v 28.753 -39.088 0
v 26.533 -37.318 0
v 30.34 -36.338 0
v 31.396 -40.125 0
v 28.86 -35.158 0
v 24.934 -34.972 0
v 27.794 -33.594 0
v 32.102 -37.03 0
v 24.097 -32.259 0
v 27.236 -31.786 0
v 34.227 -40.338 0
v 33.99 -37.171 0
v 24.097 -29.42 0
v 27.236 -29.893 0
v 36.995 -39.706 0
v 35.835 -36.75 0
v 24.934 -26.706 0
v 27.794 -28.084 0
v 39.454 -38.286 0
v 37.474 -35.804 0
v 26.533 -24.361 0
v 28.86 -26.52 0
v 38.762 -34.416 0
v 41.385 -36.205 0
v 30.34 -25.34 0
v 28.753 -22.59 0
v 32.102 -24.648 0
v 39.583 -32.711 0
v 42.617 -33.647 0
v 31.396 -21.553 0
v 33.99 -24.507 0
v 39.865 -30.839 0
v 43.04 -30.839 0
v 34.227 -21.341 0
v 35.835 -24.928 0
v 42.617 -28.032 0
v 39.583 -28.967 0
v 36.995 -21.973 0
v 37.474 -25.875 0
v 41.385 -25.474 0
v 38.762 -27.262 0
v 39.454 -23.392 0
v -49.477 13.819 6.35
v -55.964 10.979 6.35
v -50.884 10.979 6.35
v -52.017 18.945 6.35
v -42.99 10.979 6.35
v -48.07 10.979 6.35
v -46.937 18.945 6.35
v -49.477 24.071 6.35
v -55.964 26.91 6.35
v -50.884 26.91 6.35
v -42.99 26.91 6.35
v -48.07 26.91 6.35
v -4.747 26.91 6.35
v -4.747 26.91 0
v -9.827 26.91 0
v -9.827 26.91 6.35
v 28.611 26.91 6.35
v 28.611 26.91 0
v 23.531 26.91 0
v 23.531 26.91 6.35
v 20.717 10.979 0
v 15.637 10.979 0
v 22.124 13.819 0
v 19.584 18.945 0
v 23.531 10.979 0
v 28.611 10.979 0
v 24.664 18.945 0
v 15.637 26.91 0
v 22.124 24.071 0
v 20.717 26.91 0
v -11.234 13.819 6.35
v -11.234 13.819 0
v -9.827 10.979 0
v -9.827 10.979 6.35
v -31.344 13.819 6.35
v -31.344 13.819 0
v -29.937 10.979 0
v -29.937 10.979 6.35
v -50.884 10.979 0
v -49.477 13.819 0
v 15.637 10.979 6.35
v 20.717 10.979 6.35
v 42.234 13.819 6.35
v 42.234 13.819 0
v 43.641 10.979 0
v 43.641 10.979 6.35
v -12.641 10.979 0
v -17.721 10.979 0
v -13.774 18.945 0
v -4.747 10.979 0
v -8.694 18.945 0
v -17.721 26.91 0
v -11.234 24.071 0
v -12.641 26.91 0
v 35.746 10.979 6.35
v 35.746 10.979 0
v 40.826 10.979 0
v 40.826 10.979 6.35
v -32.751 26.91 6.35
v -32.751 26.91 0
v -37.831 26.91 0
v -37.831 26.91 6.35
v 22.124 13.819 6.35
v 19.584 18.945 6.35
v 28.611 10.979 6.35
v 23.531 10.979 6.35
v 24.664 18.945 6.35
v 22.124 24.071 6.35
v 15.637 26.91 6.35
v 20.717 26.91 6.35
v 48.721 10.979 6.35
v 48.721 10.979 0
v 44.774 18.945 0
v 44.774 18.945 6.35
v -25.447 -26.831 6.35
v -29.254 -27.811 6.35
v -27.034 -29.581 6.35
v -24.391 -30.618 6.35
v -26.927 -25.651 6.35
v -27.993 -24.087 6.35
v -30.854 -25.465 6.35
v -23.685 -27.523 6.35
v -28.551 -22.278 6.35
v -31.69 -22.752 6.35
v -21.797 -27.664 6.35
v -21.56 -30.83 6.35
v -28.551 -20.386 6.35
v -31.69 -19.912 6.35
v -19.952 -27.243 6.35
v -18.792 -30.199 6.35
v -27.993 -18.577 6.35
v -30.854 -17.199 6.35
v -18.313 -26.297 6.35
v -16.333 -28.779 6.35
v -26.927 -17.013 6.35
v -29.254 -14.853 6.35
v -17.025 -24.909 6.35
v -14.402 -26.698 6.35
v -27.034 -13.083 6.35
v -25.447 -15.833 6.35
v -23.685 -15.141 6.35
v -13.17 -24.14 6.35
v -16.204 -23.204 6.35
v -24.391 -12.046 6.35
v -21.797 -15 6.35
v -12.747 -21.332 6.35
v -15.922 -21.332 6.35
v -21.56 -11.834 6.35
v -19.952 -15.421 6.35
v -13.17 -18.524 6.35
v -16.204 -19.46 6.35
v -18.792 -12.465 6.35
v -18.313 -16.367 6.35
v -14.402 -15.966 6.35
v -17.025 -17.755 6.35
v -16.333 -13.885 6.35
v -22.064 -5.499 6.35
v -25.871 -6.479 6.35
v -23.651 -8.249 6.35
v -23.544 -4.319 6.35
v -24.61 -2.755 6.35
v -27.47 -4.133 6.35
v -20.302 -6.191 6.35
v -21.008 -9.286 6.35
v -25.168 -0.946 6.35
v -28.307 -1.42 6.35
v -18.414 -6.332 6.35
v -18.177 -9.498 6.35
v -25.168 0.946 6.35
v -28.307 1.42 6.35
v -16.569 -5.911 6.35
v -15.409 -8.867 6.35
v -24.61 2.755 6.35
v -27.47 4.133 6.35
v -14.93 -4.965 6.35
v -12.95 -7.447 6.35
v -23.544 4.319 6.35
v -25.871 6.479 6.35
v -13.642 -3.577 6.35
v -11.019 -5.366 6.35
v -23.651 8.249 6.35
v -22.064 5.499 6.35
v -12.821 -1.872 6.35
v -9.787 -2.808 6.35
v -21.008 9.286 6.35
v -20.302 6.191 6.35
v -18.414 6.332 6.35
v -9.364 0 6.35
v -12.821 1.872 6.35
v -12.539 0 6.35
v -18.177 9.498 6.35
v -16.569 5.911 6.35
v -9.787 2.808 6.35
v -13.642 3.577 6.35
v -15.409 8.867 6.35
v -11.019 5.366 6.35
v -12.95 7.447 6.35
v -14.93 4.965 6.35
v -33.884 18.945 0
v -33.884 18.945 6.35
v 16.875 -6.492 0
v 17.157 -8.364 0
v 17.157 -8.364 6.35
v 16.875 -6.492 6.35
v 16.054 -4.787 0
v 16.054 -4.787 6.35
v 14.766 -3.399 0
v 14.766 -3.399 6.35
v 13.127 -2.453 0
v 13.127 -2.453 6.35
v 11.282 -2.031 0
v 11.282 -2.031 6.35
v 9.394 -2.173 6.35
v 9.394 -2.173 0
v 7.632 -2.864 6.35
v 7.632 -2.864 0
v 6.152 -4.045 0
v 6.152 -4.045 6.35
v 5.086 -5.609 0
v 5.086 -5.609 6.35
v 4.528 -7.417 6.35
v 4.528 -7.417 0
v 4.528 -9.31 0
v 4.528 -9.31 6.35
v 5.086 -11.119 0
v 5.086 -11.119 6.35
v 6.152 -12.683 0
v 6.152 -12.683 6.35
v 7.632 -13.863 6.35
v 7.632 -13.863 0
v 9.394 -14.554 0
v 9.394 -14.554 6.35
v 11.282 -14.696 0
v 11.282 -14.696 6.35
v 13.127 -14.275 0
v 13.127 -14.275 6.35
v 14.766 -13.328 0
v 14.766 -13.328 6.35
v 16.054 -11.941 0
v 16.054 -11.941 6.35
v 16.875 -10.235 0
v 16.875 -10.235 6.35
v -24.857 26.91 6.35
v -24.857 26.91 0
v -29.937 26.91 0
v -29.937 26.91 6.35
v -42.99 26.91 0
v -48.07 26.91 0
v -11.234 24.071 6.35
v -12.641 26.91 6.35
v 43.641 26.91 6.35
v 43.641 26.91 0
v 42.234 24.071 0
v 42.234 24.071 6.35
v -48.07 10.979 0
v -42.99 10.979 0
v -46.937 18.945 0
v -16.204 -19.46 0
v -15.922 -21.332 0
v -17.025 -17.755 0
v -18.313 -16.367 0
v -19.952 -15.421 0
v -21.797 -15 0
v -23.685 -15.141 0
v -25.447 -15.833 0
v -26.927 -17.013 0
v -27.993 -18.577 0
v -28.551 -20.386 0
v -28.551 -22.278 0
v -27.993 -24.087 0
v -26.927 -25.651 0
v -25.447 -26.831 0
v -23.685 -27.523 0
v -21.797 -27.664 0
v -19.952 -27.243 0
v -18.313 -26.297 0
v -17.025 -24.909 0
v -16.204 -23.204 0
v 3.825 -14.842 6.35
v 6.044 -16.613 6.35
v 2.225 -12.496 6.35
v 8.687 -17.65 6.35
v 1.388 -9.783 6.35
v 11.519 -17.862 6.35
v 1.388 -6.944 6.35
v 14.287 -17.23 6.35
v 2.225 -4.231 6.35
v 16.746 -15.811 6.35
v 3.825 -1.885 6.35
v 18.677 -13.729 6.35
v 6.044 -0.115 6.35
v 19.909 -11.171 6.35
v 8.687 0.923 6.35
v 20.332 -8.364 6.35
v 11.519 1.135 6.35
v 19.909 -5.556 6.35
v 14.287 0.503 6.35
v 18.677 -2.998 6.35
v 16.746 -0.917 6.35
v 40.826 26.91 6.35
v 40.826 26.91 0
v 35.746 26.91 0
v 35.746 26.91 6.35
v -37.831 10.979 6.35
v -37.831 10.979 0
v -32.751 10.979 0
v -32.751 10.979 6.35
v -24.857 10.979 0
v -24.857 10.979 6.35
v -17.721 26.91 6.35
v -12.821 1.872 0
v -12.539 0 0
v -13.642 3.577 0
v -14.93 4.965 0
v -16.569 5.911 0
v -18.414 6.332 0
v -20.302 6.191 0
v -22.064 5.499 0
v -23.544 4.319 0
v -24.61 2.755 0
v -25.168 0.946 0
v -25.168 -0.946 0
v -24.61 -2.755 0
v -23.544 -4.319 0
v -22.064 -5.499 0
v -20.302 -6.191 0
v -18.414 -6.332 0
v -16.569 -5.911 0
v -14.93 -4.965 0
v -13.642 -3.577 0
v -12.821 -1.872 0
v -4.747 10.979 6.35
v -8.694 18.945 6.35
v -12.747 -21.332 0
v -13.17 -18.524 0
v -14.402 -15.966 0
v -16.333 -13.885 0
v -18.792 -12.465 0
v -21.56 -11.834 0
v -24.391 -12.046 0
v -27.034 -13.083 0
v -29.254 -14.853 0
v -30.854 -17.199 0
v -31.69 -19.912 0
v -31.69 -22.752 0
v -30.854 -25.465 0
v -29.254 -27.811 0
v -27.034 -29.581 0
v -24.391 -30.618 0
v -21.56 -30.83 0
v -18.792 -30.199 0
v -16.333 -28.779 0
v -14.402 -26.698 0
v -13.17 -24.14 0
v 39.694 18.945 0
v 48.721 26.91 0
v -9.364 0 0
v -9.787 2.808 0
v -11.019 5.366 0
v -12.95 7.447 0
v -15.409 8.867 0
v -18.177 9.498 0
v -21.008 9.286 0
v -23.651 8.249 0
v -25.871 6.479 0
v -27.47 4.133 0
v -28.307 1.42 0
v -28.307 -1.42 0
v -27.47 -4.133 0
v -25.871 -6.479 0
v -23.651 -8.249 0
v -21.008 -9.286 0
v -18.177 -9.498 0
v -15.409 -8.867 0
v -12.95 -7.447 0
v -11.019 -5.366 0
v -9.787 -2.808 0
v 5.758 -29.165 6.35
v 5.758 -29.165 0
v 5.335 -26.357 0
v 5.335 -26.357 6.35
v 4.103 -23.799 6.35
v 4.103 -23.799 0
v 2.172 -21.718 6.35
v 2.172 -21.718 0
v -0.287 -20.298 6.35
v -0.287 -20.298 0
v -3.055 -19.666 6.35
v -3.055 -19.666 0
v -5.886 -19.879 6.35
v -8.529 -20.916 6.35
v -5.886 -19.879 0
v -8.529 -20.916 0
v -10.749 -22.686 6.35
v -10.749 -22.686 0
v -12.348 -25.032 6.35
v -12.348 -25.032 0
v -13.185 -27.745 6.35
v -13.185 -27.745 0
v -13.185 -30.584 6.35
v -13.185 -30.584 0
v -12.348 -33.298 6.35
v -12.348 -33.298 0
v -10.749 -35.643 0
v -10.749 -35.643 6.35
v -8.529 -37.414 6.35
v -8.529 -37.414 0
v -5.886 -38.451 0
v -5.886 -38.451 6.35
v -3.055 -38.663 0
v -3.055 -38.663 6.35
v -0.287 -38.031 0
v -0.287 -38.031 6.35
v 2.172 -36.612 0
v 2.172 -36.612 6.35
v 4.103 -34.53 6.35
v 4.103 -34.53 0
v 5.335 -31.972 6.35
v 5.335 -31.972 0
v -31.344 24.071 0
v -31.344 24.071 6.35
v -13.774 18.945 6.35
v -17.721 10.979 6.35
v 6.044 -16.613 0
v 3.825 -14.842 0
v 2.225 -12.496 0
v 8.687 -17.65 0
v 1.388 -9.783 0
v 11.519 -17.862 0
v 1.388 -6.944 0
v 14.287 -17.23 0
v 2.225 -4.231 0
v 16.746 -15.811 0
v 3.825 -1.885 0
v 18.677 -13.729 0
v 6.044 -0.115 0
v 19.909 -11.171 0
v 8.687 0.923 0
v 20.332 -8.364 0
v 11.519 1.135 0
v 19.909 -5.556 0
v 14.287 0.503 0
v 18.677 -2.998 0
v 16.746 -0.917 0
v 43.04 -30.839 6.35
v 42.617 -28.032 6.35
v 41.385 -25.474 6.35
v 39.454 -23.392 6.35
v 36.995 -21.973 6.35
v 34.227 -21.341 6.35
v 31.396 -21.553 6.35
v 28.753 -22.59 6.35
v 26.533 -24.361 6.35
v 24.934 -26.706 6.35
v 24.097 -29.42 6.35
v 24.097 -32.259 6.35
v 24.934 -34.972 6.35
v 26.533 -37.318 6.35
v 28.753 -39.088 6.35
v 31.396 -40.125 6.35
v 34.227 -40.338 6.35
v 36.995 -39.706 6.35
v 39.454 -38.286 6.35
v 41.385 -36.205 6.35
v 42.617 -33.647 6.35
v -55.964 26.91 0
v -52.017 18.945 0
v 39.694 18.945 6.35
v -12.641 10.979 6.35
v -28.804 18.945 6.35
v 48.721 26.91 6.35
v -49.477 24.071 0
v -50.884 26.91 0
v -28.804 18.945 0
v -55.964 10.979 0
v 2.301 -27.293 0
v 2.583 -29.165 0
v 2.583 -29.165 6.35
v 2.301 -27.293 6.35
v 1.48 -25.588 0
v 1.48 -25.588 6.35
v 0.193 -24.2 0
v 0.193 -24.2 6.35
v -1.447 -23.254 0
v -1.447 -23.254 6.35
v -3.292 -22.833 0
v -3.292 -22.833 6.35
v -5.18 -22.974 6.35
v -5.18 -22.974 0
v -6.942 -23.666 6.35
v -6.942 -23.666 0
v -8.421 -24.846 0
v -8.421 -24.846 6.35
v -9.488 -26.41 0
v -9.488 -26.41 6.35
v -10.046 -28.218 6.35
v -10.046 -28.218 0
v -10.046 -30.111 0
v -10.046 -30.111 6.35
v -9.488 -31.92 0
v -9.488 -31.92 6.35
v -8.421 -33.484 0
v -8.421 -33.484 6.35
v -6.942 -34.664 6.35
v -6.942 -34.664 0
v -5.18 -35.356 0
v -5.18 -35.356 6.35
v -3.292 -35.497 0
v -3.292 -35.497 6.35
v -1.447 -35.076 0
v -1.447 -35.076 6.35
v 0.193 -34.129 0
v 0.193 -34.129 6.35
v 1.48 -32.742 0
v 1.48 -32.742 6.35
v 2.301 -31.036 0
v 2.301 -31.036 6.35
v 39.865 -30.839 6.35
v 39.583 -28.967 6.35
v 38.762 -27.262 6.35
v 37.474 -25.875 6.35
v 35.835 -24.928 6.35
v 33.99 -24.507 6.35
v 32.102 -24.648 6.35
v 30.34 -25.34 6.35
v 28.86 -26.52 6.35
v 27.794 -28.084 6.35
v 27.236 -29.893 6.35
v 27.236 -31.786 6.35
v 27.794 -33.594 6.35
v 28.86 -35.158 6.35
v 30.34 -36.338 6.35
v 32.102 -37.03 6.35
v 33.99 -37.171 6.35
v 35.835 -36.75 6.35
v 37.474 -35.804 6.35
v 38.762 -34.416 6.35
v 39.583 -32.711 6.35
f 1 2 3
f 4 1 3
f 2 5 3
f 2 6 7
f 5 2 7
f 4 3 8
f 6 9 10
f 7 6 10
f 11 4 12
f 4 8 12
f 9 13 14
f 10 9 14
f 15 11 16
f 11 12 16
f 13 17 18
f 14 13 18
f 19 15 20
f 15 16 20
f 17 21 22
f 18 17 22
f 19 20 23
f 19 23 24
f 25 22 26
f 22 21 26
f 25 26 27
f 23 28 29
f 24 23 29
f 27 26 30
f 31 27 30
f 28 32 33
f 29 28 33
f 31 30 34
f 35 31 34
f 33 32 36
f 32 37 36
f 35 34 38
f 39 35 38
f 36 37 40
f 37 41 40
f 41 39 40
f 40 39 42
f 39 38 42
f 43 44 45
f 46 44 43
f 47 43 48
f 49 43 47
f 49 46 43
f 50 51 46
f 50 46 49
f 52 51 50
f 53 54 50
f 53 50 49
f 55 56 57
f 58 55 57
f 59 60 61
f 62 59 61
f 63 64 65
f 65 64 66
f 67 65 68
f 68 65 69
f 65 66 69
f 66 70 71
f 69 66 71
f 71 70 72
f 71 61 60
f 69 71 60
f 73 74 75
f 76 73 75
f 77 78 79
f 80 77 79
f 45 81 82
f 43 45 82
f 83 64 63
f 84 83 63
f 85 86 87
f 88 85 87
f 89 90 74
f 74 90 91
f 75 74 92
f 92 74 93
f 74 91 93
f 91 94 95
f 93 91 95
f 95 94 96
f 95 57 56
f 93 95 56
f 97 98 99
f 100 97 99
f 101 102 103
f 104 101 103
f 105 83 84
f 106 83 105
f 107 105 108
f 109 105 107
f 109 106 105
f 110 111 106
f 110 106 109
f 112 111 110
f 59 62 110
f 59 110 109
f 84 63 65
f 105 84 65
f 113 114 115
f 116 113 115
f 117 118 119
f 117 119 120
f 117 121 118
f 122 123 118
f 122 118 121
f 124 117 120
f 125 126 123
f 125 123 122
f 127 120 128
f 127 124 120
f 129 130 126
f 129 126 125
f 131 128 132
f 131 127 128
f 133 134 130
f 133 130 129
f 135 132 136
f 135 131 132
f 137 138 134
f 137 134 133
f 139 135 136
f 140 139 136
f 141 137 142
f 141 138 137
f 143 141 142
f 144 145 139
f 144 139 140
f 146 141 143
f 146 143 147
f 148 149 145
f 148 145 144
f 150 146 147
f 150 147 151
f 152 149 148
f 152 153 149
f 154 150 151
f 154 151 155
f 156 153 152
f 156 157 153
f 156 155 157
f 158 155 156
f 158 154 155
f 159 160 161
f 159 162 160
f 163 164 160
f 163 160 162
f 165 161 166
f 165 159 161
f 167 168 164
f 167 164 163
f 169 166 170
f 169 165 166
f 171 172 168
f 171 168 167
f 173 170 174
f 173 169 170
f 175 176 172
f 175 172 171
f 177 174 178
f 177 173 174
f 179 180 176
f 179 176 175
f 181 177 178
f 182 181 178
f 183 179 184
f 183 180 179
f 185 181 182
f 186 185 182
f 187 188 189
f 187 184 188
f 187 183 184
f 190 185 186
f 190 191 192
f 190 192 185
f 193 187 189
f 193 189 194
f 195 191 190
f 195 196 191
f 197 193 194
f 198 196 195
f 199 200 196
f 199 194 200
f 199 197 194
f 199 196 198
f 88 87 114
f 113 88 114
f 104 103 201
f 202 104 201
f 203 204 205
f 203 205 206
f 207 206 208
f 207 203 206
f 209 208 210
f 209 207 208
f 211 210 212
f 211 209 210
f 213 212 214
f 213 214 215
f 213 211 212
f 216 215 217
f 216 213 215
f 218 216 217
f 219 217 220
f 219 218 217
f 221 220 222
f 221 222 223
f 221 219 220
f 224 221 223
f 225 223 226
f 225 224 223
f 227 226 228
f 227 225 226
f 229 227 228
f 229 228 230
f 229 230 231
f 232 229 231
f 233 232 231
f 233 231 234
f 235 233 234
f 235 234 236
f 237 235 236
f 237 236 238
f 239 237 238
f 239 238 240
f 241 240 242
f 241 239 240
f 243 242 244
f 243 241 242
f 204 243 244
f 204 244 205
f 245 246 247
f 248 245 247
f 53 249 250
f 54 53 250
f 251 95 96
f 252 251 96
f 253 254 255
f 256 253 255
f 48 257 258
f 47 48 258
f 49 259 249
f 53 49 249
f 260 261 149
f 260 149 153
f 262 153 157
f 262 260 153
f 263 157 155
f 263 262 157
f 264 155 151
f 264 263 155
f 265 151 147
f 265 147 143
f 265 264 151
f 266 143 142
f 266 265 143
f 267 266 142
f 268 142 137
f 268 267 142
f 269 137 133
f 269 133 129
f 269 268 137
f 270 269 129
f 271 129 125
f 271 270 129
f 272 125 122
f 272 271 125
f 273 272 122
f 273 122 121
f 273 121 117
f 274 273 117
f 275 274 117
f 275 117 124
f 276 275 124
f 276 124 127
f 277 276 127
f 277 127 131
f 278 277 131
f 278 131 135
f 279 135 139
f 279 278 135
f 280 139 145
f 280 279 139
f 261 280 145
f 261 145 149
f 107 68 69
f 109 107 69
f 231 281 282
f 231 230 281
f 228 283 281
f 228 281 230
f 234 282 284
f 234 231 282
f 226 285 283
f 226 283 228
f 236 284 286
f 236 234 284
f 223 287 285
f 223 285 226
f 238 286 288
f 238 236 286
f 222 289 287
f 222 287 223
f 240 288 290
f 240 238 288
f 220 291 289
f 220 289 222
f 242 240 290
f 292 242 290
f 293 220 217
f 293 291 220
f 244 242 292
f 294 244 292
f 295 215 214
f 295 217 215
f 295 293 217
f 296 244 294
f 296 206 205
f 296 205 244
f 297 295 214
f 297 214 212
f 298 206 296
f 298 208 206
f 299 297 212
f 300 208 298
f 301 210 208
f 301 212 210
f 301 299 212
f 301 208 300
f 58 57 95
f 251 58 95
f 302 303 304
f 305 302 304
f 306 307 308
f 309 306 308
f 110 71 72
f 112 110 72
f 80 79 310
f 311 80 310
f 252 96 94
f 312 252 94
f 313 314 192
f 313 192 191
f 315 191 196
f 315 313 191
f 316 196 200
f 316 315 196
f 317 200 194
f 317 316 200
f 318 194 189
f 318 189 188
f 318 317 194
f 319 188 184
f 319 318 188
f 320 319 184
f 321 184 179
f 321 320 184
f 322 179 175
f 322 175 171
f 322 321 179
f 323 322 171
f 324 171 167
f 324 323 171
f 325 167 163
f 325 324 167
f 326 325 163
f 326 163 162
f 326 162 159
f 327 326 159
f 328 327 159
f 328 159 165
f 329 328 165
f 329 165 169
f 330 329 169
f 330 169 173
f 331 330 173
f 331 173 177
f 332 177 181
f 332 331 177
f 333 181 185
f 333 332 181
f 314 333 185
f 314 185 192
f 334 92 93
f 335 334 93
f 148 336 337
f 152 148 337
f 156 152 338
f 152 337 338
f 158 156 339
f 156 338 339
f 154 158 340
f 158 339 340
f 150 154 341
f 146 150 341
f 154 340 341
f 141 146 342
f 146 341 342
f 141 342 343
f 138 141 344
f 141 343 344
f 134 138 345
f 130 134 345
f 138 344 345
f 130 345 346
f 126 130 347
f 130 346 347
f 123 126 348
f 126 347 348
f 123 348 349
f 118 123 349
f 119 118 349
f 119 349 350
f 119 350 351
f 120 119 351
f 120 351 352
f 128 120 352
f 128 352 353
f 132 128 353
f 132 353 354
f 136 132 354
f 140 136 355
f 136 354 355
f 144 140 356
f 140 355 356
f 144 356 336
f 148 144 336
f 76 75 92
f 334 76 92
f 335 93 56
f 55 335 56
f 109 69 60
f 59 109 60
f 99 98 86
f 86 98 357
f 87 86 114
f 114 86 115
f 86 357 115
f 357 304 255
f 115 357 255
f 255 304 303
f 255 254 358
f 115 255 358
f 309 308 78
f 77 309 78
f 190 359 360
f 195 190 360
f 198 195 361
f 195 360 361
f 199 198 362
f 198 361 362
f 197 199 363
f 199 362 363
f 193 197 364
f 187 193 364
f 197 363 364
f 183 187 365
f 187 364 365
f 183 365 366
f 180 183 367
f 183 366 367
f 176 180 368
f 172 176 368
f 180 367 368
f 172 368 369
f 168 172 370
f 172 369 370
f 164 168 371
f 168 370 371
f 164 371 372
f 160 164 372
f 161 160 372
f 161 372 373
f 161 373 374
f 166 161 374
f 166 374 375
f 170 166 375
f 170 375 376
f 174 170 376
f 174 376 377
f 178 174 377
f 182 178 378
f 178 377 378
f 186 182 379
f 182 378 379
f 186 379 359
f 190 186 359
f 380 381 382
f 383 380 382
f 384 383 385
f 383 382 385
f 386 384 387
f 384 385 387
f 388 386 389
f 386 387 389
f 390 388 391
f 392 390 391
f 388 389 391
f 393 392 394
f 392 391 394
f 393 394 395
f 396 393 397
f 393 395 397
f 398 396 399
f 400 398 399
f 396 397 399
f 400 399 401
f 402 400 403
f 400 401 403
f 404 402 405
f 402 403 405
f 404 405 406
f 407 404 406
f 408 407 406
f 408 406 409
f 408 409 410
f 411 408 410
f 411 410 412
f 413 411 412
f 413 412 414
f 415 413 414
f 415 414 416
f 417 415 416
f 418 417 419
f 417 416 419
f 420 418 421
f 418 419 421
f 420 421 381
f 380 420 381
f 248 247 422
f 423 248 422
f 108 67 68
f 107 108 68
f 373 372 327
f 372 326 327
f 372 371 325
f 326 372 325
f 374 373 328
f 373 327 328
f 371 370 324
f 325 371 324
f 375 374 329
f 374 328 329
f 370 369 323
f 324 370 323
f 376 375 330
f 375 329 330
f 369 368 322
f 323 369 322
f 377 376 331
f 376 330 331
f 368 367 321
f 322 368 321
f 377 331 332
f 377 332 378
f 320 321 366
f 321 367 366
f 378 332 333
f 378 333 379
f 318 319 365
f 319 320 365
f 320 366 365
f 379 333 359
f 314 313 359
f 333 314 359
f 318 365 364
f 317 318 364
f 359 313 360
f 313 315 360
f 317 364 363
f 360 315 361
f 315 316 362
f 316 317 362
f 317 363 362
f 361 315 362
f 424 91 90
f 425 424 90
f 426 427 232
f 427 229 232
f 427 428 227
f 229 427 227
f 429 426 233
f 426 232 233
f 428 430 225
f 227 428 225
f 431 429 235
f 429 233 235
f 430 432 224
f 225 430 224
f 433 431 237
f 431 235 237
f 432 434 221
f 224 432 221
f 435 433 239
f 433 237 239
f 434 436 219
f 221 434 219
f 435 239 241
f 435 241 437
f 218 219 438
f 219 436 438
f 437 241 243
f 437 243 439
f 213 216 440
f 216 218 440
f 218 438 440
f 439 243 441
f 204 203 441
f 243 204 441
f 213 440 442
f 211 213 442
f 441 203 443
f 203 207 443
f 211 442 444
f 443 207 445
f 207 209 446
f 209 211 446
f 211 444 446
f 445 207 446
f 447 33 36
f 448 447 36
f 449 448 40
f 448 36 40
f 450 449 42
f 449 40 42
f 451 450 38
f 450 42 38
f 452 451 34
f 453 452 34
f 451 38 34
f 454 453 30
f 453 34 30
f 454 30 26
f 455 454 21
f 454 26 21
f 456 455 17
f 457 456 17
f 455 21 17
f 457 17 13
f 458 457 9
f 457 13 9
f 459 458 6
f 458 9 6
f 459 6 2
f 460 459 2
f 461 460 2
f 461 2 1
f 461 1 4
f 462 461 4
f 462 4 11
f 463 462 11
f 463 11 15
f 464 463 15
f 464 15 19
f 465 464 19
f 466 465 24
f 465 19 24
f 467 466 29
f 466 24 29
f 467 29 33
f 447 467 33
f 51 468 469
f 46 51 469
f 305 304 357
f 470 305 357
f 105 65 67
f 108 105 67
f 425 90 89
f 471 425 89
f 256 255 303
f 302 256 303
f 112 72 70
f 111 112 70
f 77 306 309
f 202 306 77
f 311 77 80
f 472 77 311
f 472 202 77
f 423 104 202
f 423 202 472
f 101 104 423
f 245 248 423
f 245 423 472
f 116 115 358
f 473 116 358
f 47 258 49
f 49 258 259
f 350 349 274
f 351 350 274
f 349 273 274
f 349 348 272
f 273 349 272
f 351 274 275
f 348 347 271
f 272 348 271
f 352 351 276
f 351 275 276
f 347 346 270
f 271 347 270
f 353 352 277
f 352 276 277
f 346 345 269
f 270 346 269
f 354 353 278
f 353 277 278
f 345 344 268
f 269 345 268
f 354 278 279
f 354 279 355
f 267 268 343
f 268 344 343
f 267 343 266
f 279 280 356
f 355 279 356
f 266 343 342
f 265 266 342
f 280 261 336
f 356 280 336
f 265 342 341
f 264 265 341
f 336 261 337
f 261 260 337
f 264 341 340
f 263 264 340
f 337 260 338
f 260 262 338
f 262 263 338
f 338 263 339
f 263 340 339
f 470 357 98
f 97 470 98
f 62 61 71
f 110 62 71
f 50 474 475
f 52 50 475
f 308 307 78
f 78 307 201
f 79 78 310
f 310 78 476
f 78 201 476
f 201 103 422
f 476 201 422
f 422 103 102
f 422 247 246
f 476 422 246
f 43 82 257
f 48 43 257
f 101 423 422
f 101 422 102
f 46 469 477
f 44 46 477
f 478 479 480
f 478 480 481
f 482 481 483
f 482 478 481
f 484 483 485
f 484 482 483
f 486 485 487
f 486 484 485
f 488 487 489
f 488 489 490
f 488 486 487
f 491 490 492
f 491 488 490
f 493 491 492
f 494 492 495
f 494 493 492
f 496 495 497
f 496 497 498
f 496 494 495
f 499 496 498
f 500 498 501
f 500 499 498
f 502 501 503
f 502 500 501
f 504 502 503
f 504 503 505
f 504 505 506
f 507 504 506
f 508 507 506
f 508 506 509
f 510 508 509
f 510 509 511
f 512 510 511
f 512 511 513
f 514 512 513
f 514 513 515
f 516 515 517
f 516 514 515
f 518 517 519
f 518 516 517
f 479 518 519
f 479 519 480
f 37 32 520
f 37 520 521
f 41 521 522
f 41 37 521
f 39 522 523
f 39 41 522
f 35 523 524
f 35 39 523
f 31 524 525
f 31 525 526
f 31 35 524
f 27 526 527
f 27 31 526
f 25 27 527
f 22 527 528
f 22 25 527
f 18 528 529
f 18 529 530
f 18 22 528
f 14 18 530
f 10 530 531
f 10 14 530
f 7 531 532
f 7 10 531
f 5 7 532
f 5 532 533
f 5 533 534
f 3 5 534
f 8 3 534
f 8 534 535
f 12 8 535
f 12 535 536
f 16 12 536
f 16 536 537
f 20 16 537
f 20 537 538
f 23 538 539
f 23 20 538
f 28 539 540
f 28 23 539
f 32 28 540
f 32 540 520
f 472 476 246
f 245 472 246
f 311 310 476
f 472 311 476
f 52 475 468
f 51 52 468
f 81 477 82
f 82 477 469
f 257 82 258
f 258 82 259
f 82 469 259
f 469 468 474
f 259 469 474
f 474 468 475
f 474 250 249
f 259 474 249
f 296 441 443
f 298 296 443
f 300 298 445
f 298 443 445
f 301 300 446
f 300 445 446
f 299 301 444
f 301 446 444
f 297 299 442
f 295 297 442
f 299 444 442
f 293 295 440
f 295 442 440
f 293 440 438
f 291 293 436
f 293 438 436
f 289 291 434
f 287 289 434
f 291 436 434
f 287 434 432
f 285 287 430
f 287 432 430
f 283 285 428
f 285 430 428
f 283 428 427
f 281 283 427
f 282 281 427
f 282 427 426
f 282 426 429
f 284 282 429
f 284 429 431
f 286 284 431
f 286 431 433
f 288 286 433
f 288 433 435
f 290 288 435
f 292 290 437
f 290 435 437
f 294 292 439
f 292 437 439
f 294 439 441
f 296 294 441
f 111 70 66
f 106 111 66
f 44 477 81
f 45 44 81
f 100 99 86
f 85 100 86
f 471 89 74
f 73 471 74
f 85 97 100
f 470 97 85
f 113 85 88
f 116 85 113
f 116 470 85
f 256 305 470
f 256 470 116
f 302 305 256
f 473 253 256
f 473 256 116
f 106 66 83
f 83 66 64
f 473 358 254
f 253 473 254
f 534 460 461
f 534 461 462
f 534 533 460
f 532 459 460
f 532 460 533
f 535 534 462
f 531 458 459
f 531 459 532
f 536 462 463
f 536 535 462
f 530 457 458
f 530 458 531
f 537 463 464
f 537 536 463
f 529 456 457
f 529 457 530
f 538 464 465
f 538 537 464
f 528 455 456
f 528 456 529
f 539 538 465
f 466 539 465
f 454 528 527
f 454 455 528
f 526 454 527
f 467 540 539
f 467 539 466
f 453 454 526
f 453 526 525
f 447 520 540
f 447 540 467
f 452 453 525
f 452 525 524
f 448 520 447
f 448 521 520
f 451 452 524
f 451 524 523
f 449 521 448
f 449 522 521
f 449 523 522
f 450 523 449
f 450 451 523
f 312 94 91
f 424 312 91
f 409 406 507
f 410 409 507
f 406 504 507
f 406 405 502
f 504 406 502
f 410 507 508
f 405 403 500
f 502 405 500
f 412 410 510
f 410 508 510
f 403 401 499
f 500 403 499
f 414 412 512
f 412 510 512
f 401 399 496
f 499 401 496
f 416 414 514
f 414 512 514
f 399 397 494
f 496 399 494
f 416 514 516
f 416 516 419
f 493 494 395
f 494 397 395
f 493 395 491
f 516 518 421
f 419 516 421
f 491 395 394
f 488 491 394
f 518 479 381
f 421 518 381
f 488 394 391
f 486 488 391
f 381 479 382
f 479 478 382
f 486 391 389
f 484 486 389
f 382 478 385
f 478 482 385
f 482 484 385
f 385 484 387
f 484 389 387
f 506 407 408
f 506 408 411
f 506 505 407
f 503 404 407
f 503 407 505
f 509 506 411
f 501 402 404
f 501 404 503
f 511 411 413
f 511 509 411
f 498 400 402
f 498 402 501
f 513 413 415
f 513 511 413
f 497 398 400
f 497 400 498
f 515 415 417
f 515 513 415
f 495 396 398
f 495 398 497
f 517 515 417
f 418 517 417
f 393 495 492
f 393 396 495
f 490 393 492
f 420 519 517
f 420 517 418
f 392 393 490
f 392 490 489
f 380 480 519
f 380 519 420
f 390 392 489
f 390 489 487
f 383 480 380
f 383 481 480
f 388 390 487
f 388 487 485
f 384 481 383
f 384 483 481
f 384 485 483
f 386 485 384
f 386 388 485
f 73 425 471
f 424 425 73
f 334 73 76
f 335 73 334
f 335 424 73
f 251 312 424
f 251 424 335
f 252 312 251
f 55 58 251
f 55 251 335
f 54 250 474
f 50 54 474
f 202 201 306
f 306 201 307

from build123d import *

# Parameters (mm, degrees)
F0_R     = 9.525
F0_R_2   = 6.35
F1_DEPTH = 6.35


with BuildPart() as f1:
    # F0 (on Top) → F1 (new body)
    with BuildSketch(Plane.XY):
        with Locations((-3.7666179448, -29.1648005379)):
            Circle(F0_R)
        with Locations((-3.7666179448, -29.1648005379)):
            Circle(F0_R_2, mode=Mode.SUBTRACT)
    extrude(amount=F1_DEPTH)


with BuildPart() as f1b:
    # F0 (on Top) → F1, piece 2 (new body)
    with BuildSketch(Plane.XY):
        with Locations((-18.8887231052, 0)):
            Circle(F0_R)
        with Locations((-18.8887231052, 0)):
            Circle(F0_R_2, mode=Mode.SUBTRACT)
    extrude(amount=F1_DEPTH)


with BuildPart() as f1c:
    # F0 (on Top) → F1, piece 3 (new body)
    with BuildSketch(Plane.XY):
        with Locations((-22.2717784345, -21.3320404291)):
            Circle(F0_R)
        with Locations((-22.2717784345, -21.3320404291)):
            Circle(F0_R_2, mode=Mode.SUBTRACT)
    extrude(amount=F1_DEPTH)


with BuildPart() as f1d:
    # F0 (on Top) → F1, piece 4 (new body)
    with BuildSketch(Plane.XY):
        with Locations((10.8069814742, -8.3636632189)):
            Circle(F0_R)
        with Locations((10.8069814742, -8.3636632189)):
            Circle(F0_R_2, mode=Mode.SUBTRACT)
    extrude(amount=F1_DEPTH)


with BuildPart() as f1e:
    # F0 (on Top) → F1, piece 5 (new body)
    with BuildSketch(Plane.XY):
        with Locations((33.5152931511, -30.8391787112)):
            Circle(F0_R)
        with Locations((33.5152931511, -30.8391787112)):
            Circle(F0_R_2, mode=Mode.SUBTRACT)
    extrude(amount=F1_DEPTH)


with BuildPart() as f1f:
    # F0 (on Top) → F1, piece 6 (new body)
    with BuildSketch(Plane.XY):
        Polygon((-12.6408703996, 26.9102798775), (-17.7208703996, 26.9102798775), (-13.7737535327, 18.9445803828), (-11.2337535327, 24.0705691486), align=None)
        Polygon((-11.2337535327, 24.0705691486), (-13.7737535327, 18.9445803828), (-11.2337535327, 13.818591617), (-8.6937535327, 18.9445803828), align=None)
        Polygon((-11.2337535327, 13.818591617), (-13.7737535327, 18.9445803828), (-17.7208703996, 10.9788808881), (-12.6408703996, 10.9788808881), align=None)
        Polygon((-9.8266366659, 26.9102798775), (-11.2337535327, 24.0705691486), (-8.6937535327, 18.9445803828), (-4.7466366659, 26.9102798775), (-6.5851830877, 26.9102798775), align=None)
        Polygon((-8.6937535327, 18.9445803828), (-11.2337535327, 13.818591617), (-9.8266366659, 10.9788808881), (-4.7466366659, 10.9788808881), align=None)
    extrude(amount=F1_DEPTH)


with BuildPart() as f1g:
    # F0 (on Top) → F1, piece 7 (new body)
    with BuildSketch(Plane.XY):
        Polygon((-31.3436286444, 13.818591617), (-29.9365117776, 10.9788808881), (-24.8565117776, 10.9788808881), (-28.8036286444, 18.9445803828), align=None)
        Polygon((-32.7507455112, 10.9788808881), (-31.3436286444, 13.818591617), (-33.8836286444, 18.9445803828), (-37.8307455112, 10.9788808881), align=None)
        Polygon((-33.8836286444, 18.9445803828), (-31.3436286444, 13.818591617), (-28.8036286444, 18.9445803828), (-31.3436286444, 24.0705691486), align=None)
        Polygon((-37.8307455112, 26.9102798775), (-33.8836286444, 18.9445803828), (-31.3436286444, 24.0705691486), (-32.7507455112, 26.9102798775), align=None)
        Polygon((-31.3436286444, 24.0705691486), (-28.8036286444, 18.9445803828), (-24.8565117776, 26.9102798775), (-29.9365117776, 26.9102798775), align=None)
    extrude(amount=F1_DEPTH)


with BuildPart() as f1h:
    # F0 (on Top) → F1, piece 8 (new body)
    with BuildSketch(Plane.XY):
        Polygon((48.720662192, 26.9102798775), (43.640662192, 26.9102798775), (42.2335453251, 24.0705691486), (44.7735453251, 18.9445803828), align=None)
        Polygon((44.7735453251, 18.9445803828), (42.2335453251, 24.0705691486), (39.6935453251, 18.9445803828), (42.2335453251, 13.818591617), align=None)
        Polygon((39.6935453251, 18.9445803828), (42.2335453251, 24.0705691486), (40.8264284583, 26.9102798775), (35.7464284583, 26.9102798775), align=None)
        Polygon((42.2335453251, 13.818591617), (39.6935453251, 18.9445803828), (35.7464284583, 10.9788808881), (40.8264284583, 10.9788808881), align=None)
        Polygon((48.720662192, 10.9788808881), (44.7735453251, 18.9445803828), (42.2335453251, 13.818591617), (43.640662192, 10.9788808881), align=None)
    extrude(amount=F1_DEPTH)


with BuildPart() as f1i:
    # F0 (on Top) → F1, piece 9 (new body)
    with BuildSketch(Plane.XY):
        Polygon((24.6636702135, 18.9445803828), (28.6107870803, 26.9102798775), (23.5307870803, 26.9102798775), (22.1236702135, 24.0705691486), align=None)
        Polygon((22.1236702135, 13.818591617), (24.6636702135, 18.9445803828), (22.1236702135, 24.0705691486), (19.5836702135, 18.9445803828), align=None)
        Polygon((28.6107870803, 10.9788808881), (24.6636702135, 18.9445803828), (22.1236702135, 13.818591617), (23.5307870803, 10.9788808881), align=None)
        Polygon((19.5836702135, 18.9445803828), (22.1236702135, 24.0705691486), (20.7165533467, 26.9102798775), (15.6365533467, 26.9102798775), align=None)
        Polygon((20.7165533467, 10.9788808881), (22.1236702135, 13.818591617), (19.5836702135, 18.9445803828), (15.6365533467, 10.9788808881), align=None)
    extrude(amount=F1_DEPTH)


with BuildPart() as f1j:
    # F0 (on Top) → F1, piece 10 (new body)
    with BuildSketch(Plane.XY):
        Polygon((-52.0171459991, 18.9445803828), (-55.9642628659, 10.9788808881), (-50.8842628659, 10.9788808881), (-49.4771459991, 13.818591617), align=None)
        Polygon((-49.4771459991, 24.0705691486), (-52.0171459991, 18.9445803828), (-49.4771459991, 13.818591617), (-46.9371459991, 18.9445803828), align=None)
        Polygon((-55.9642628659, 26.9102798775), (-52.0171459991, 18.9445803828), (-49.4771459991, 24.0705691486), (-50.8842628659, 26.9102798775), align=None)
        Polygon((-46.9371459991, 18.9445803828), (-49.4771459991, 13.818591617), (-48.0700291323, 10.9788808881), (-42.9900291323, 10.9788808881), align=None)
        Polygon((-48.0700291323, 26.9102798775), (-49.4771459991, 24.0705691486), (-46.9371459991, 18.9445803828), (-42.9900291323, 26.9102798775), align=None)
    extrude(amount=F1_DEPTH)


solid = Compound([f1.part, f1b.part, f1c.part, f1d.part, f1e.part, f1f.part, f1g.part, f1h.part, f1i.part, f1j.part])
